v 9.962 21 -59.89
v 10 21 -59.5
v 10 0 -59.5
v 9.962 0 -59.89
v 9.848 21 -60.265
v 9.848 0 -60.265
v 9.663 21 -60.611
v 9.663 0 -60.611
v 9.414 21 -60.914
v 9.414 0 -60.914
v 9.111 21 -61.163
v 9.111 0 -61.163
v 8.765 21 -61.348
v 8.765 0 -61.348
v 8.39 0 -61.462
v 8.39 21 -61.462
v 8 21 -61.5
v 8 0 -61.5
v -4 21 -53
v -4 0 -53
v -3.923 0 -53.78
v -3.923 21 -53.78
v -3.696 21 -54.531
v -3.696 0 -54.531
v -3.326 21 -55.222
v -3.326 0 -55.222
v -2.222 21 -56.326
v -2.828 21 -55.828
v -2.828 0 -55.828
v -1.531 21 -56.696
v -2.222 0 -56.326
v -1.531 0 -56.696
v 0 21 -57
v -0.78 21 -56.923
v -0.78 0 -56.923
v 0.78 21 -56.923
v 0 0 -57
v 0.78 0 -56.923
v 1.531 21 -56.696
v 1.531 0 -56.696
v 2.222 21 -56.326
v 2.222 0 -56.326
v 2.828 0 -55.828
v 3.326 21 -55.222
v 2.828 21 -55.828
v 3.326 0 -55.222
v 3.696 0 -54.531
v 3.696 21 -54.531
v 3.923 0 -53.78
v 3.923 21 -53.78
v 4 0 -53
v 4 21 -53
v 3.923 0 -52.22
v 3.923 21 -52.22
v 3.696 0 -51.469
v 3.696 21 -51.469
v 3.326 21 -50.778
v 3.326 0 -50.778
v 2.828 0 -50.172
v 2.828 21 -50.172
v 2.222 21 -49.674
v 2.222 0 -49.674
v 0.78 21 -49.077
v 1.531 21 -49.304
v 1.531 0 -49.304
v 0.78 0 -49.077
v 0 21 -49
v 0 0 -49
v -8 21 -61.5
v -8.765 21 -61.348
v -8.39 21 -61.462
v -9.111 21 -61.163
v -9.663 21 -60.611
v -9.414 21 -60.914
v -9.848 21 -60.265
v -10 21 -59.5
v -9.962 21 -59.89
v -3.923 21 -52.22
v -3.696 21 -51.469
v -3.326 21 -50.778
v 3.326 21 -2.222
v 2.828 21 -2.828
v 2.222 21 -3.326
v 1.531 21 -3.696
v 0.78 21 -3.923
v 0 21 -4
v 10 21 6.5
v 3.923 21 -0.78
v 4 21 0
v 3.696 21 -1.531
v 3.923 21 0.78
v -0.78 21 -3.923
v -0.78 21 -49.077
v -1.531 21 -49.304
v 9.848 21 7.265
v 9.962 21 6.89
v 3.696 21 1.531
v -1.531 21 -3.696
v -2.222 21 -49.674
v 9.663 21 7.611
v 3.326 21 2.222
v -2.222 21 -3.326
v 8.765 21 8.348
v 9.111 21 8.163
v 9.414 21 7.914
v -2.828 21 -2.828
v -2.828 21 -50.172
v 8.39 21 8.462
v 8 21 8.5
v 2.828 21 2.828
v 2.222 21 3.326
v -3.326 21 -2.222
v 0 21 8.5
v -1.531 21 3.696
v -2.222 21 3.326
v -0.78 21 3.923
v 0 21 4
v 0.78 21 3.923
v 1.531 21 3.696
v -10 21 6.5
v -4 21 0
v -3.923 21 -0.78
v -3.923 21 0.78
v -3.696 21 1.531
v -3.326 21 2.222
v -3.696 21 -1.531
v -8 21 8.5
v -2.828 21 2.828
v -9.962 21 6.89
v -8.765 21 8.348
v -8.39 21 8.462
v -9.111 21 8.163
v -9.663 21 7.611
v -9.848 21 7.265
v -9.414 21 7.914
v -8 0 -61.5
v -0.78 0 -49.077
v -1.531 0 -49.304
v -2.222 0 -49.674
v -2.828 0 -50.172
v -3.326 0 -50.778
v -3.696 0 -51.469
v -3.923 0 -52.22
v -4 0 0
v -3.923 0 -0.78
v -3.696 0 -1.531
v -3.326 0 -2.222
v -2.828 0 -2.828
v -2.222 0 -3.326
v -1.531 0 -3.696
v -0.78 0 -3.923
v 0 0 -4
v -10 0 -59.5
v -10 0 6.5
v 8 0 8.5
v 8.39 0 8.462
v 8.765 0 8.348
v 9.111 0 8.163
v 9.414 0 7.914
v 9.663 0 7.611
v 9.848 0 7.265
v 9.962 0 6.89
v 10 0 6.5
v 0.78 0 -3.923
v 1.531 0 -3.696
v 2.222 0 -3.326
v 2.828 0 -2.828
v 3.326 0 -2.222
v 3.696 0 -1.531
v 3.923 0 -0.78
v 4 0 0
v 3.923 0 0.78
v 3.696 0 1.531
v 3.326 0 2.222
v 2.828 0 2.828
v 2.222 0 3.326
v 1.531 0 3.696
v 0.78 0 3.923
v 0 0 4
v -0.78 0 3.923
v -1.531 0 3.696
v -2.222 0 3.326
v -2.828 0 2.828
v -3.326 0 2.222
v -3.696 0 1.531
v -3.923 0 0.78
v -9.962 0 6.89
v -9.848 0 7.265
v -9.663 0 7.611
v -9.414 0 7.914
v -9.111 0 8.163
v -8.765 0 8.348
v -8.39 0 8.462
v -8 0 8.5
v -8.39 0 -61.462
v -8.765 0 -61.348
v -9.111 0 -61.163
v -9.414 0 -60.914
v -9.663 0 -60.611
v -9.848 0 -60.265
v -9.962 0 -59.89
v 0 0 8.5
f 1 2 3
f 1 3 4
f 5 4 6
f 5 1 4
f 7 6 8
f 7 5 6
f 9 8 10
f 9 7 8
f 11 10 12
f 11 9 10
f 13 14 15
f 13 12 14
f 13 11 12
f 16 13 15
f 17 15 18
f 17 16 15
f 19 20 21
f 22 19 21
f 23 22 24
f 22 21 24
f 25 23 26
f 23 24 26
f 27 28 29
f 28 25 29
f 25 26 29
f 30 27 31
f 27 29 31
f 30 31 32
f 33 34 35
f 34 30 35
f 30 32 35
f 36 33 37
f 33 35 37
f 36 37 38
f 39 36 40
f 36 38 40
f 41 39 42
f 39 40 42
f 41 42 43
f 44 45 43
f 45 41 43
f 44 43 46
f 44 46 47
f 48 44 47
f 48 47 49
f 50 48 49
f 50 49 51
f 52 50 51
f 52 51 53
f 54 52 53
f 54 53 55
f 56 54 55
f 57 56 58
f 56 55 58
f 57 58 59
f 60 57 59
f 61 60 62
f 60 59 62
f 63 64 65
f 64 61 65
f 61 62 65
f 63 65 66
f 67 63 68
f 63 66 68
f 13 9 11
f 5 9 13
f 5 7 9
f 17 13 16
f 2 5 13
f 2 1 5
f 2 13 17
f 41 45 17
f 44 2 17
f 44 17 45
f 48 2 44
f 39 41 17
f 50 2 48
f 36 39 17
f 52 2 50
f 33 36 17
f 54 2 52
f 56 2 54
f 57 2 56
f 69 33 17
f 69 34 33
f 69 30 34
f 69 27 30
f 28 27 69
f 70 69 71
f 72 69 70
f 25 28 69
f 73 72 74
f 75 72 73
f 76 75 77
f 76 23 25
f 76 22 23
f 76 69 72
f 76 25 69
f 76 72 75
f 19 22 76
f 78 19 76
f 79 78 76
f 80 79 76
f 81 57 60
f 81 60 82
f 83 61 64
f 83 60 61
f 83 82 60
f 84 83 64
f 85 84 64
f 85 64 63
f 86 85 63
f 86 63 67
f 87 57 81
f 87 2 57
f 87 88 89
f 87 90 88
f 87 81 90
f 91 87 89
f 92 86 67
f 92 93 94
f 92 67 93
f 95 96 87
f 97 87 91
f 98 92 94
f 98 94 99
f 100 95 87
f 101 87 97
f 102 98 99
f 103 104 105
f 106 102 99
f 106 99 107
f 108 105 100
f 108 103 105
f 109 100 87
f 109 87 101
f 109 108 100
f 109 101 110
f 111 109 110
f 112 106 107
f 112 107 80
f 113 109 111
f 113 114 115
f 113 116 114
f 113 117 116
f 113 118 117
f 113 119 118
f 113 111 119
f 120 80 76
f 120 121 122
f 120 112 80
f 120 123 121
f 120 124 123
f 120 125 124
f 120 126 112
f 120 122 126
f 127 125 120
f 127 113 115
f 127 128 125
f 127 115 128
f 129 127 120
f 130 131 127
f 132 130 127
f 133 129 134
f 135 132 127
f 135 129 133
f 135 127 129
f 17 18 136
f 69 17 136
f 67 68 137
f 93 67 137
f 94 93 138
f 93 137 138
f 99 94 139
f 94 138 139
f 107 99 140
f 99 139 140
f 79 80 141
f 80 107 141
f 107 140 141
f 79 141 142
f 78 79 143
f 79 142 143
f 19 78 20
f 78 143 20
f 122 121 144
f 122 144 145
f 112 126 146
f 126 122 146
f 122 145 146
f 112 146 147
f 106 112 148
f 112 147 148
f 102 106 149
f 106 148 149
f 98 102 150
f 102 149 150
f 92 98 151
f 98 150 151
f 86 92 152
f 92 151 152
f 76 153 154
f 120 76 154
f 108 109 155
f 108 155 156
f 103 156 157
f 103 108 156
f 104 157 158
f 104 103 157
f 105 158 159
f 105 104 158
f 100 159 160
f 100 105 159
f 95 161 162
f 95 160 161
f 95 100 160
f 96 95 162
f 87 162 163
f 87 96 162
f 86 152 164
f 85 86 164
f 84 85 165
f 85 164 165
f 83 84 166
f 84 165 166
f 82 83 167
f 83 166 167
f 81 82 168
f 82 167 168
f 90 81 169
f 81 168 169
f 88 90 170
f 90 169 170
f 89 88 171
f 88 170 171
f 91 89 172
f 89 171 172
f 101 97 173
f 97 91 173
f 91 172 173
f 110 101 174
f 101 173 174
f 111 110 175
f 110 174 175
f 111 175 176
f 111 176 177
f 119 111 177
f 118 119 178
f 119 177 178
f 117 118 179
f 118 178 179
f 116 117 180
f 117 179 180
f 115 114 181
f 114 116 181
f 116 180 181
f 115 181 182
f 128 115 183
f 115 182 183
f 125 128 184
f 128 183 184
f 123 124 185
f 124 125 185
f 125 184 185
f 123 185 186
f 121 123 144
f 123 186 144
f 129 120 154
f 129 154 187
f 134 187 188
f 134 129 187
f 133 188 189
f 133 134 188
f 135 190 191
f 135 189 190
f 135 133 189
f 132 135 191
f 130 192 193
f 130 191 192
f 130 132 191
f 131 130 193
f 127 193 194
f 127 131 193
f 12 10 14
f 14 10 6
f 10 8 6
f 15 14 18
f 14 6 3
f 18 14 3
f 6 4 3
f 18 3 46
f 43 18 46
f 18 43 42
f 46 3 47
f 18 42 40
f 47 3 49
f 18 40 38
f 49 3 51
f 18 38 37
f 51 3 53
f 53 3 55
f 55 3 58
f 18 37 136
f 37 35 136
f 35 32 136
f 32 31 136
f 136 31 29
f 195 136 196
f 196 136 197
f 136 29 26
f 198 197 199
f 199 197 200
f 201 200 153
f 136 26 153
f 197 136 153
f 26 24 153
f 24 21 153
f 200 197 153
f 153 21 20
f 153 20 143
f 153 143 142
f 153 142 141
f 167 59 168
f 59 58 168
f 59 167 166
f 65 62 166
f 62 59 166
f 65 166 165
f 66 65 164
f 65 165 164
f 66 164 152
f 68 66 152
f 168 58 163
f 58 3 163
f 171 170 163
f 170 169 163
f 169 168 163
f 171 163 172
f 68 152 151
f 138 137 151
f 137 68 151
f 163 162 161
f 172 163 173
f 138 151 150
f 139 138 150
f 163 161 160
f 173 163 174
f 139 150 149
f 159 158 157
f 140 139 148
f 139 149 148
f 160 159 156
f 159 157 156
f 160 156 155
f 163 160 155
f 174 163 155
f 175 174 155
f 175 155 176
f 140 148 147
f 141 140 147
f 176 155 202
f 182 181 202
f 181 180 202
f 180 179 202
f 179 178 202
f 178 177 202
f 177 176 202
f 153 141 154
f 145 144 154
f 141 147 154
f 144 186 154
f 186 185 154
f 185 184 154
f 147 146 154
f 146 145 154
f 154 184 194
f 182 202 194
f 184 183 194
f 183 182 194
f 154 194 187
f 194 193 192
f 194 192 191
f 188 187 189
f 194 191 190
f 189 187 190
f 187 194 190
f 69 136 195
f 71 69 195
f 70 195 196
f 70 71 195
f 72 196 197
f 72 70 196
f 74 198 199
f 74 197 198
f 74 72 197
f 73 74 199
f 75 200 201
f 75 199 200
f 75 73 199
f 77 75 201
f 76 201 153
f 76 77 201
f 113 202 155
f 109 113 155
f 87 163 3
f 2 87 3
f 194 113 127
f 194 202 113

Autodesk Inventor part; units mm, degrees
ref_plane "YZ Plane" through (0, 0, 0) normal (1, 0, 0) x (0, 1, 0)
ref_plane "XZ Plane" through (0, 0, 0) normal (0, 1, 0) x (-1, 0, 0)
ref_plane "XY Plane" through (0, 0, 0) normal (0, 0, 1) x (1, 0, 0)
sketch "Sketch1" plane through (0, 0, 0) normal (0, 1, 0) x (-1, 0, 0)
  line L0 (0, 0) -> (0, -53)
  circle A0 centre (0, 0) radius 4
  circle A1 centre (0, -53) radius 4
  line L1 (0, 8.5) -> (10, 8.5)
  line L2 (10, 8.5) -> (-10, 8.5)
  line L3 (-10, 8.5) -> (-10, -61.5)
  line L4 (-10, -61.5) -> (10, -61.5)
  line L5 (10, -61.5) -> (10, 8.5)
  dimension "d0" = 53
  dimension "d1" = 8
  dimension "d2" = 8
  dimension "d3" = 8.5
  dimension "d4" = 10
  dimension "d8" = 10
  dimension "d9" = 10
  dimension "d10" = 70
extrude "Extrusion1" add sketch "Sketch1" along normal blind 21
fillet "Fillet1" radius 2 4 edges at (10, 10.5, 8.5) (-10, 10.5, 8.5) (10, 10.5, -61.5) (-10, 10.5, -61.5)
properties part number "Bearing Seats 10mm (Short)"
